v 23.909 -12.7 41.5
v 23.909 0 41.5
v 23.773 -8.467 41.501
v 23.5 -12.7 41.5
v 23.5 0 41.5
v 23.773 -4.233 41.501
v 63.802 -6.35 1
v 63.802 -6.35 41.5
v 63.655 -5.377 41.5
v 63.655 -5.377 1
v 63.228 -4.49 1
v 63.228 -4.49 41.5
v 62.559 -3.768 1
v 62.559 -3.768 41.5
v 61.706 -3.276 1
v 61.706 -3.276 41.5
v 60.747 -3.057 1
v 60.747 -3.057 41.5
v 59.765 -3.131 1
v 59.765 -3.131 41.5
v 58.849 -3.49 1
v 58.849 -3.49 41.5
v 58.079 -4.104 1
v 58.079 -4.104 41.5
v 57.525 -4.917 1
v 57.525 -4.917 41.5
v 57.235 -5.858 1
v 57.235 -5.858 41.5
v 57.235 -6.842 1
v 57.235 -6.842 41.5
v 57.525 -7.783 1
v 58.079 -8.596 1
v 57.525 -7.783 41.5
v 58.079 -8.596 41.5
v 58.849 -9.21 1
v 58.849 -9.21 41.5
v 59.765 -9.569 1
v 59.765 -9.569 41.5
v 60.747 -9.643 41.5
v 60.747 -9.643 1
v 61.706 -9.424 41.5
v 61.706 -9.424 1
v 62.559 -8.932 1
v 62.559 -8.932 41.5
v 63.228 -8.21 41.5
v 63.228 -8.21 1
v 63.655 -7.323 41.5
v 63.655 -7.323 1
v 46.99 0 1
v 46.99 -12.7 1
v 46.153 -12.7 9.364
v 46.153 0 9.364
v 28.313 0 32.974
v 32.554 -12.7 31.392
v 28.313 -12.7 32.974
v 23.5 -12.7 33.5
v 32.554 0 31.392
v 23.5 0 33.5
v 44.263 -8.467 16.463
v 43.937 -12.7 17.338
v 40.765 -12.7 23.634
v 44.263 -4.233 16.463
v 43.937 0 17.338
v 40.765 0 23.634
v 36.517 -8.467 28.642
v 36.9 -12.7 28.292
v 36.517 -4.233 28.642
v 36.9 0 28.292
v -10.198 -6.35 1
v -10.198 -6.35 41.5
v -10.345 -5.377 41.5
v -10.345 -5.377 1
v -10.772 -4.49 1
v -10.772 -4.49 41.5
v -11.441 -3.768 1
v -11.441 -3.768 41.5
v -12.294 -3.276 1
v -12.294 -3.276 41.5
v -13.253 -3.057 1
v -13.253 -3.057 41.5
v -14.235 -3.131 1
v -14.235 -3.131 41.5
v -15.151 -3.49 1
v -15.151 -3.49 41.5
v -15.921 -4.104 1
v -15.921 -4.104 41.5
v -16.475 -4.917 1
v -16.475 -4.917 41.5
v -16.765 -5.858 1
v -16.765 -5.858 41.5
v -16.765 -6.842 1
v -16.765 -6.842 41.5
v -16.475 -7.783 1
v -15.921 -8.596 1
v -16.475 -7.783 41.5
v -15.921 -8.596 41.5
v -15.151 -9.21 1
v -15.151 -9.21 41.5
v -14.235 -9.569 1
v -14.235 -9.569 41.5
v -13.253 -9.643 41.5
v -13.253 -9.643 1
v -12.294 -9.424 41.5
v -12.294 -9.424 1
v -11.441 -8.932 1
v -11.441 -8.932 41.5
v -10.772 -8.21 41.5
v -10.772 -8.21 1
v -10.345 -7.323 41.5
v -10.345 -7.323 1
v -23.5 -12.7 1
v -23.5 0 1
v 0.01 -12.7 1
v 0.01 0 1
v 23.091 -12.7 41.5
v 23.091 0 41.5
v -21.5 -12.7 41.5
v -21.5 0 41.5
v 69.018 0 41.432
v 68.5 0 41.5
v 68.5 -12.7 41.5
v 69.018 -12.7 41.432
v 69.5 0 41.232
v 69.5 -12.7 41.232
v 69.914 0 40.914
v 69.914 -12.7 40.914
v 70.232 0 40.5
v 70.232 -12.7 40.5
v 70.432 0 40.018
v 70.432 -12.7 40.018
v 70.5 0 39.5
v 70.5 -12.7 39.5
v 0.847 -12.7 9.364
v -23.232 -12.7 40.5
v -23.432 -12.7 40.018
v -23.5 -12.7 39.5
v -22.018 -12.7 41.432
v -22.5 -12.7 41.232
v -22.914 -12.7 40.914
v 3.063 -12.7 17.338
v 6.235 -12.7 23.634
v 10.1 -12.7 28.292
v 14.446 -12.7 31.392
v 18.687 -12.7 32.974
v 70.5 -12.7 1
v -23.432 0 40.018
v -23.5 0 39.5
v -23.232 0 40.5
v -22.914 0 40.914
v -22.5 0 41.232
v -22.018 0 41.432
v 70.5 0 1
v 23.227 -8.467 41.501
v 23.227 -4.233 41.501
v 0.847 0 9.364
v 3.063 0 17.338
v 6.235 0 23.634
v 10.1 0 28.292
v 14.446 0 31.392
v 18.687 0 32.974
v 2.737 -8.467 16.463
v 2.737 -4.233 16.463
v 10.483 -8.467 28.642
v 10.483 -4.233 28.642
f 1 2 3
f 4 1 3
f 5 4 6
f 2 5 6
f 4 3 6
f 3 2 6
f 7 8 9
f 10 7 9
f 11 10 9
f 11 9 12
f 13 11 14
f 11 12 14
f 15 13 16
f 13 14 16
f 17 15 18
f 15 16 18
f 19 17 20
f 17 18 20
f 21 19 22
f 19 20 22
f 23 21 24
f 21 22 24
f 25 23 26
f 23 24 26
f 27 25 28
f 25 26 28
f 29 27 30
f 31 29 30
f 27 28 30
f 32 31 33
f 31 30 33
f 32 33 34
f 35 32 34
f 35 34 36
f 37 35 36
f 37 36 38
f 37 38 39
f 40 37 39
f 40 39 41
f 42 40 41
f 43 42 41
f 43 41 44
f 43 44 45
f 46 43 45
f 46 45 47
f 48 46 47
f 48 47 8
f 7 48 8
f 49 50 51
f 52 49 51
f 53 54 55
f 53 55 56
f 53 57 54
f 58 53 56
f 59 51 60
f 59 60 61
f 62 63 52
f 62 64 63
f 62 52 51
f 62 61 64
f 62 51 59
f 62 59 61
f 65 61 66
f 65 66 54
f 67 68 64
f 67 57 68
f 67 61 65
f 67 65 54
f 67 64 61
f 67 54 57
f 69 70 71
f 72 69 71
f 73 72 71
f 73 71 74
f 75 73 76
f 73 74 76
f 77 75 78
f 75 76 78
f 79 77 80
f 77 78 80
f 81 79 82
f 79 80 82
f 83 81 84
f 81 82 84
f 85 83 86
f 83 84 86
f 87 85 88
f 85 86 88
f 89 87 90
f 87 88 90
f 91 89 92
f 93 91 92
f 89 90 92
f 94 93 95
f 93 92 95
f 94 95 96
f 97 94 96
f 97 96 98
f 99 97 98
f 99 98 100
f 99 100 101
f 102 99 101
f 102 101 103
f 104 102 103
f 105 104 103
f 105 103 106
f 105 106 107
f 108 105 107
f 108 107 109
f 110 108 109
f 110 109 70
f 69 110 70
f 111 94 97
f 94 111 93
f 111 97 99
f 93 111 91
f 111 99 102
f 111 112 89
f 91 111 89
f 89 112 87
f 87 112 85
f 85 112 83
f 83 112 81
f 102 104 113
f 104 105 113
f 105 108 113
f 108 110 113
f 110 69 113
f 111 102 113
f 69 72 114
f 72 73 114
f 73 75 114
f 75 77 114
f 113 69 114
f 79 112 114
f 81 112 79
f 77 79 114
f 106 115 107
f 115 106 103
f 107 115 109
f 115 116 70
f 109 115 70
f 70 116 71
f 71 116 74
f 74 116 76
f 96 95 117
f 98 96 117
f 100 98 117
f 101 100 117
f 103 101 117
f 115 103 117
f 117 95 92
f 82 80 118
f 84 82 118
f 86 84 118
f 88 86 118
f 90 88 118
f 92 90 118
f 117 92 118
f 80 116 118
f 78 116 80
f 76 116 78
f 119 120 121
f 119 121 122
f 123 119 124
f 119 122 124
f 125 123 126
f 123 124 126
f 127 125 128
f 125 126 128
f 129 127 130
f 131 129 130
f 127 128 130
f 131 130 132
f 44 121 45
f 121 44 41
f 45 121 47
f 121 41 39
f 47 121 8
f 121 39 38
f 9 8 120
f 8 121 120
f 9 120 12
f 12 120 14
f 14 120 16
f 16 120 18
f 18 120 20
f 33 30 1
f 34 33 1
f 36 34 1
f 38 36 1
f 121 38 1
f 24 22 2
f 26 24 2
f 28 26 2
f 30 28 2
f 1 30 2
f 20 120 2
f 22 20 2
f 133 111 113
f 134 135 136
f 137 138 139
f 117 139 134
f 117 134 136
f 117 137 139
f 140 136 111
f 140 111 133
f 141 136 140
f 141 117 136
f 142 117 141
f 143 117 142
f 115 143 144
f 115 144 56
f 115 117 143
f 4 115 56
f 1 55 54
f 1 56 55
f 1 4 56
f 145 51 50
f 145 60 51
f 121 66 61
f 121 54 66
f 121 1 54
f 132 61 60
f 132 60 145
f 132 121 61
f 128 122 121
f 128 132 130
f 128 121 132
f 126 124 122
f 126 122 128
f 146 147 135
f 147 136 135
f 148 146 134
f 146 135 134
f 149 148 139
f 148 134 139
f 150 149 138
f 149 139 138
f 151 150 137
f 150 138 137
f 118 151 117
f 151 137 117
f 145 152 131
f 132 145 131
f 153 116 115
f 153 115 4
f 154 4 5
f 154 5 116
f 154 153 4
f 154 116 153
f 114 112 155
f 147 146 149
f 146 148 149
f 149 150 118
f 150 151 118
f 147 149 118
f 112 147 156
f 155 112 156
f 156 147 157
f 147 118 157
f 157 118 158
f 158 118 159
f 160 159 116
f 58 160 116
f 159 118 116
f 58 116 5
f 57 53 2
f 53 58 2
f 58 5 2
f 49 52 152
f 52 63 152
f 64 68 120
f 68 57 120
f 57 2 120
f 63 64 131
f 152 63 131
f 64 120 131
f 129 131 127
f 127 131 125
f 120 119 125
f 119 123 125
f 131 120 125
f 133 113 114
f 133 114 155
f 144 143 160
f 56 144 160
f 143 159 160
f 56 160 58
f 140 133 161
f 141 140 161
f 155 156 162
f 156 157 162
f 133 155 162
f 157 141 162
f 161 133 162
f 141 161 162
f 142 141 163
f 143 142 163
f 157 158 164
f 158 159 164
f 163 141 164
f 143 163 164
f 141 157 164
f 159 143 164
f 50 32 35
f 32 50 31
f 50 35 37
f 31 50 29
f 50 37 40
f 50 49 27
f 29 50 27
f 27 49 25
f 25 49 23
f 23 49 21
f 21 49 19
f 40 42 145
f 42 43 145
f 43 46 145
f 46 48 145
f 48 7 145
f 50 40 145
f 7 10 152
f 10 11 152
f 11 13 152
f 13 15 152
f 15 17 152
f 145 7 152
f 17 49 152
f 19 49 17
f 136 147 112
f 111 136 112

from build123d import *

# Parameters (mm, degrees)
F1_DEPTH = 12.7
F2_R     = 3.302
F3_DEPTH = 41.5002601562
F4_W     = 102.0685225816
F4_H     = 3.4845213629
F5_DEPTH = 25
F6_R     = 2


# Not quite as in the source:
# - ends of sketch curves that miss each other by under 0.0002 mm in the source are joined
# - the dataset's text gives a spline's control points without its knots; the knots are read off the source's solid


with BuildPart() as f1:
    # F0 (on Front) → F1 (new body)
    with BuildSketch(Plane.XZ):
        with BuildLine():
            Line((-8, 0), (0, 0))
            add(Edge.make_bspline(
                [(0, 0), (0, 16.0348825157), (7.430841215, 33.6514413357), (23.5, 33.5)],
                knots=[0, 0, 0, 0, 40.9206549312, 40.9206549312, 40.9206549312, 40.9206549312], degree=3))
            add(Edge.make_bspline(
                [(47, 0), (47, 16.0348825157), (39.569158785, 33.6514413357), (23.5, 33.5)],
                knots=[0, 0, 0, 0, 40.9206549312, 40.9206549312, 40.9206549312, 40.9206549312], degree=3))
            Line((47, 0), (55, 0))
            add(Edge.make_bspline(
                [(55, 0), (55, 2.3133051501), (54.8084752548, 5.6604865088), (54.3346414744, 8.9941225704), (54.1644875118, 10.0000161913)],
                knots=[0, 0, 0, 0, 0.125, 0.1792883855, 0.1792883855, 0.1792883855, 0.1792883855], degree=3))
            add(Edge.make_bspline(
                [(54.1644875118, 10.0000161913), (53.9428588652, 11.3102110198), (53.2041802455, 14.9199242801), (51.403557473, 20.6965522199), (48.312647429, 27.0635606249), (44.7757382973, 31.8590791464), (41.27501086, 35.2044913237), (38.3020149436, 37.39930019), (34.9881581098, 39.2038242784), (31.3670929719, 40.5407901401), (27.6491274865, 41.3170292606), (25.11417344, 41.4919330376), (23.9092731988, 41.5002601562)],
                knots=[0.1792883855, 0.1792883855, 0.1792883855, 0.1792883855, 0.25, 0.375, 0.5, 0.625, 0.6875, 0.75, 0.8125, 0.875, 0.9375, 0.9926226885, 0.9926226885, 0.9926226885, 0.9926226885], degree=3))
            Line((23.9092731988, 41.5002601562), (23.5, 41.5002601562))
            Line((23.5, 41.5002601562), (23.0907268012, 41.5002601562))
            add(Edge.make_bspline(
                [(-7.1644875118, 10.0000161913), (-6.9428588652, 11.3102110198), (-6.2041802455, 14.9199242801), (-4.403557473, 20.6965522199), (-1.312647429, 27.0635606249), (2.2242617027, 31.8590791464), (5.72498914, 35.2044913237), (8.6979850564, 37.39930019), (12.0118418902, 39.2038242784), (15.6329070281, 40.5407901401), (19.3508725135, 41.3170292606), (21.88582656, 41.4919330376), (23.0907268012, 41.5002601562)],
                knots=[0.1792883855, 0.1792883855, 0.1792883855, 0.1792883855, 0.25, 0.375, 0.5, 0.625, 0.6875, 0.75, 0.8125, 0.875, 0.9375, 0.9926226885, 0.9926226885, 0.9926226885, 0.9926226885], degree=3))
            add(Edge.make_bspline(
                [(-8, 0), (-8, 2.3133051501), (-7.8084752548, 5.6604865088), (-7.3346414744, 8.9941225704), (-7.1644875118, 10.0000161913)],
                knots=[0, 0, 0, 0, 0.125, 0.1792883855, 0.1792883855, 0.1792883855, 0.1792883855], degree=3))
        make_face()
        with BuildLine():
            Line((-23.5, 0), (-8, 0))
            add(Edge.make_bspline(
                [(-8, 0), (-8, 2.3133051501), (-7.8084752548, 5.6604865088), (-7.3346414744, 8.9941225704), (-7.1644875118, 10.0000161913)],
                knots=[0, 0, 0, 0, 0.125, 0.1792883855, 0.1792883855, 0.1792883855, 0.1792883855], degree=3))
            Line((-7.1644875118, 10.0000161913), (-23.5, 10))
            Line((-23.5, 10), (-23.5, 0))
        make_face()
        with BuildLine():
            Line((-23.5, 10), (-7.1643917939, 10))
            add(Edge.make_bspline(
                [(-7.1643917939, 10), (-6.9428588652, 11.3102110198), (-6.2041802455, 14.9199242801), (-4.403557473, 20.6965522199), (-1.312647429, 27.0635606249), (2.2242617027, 31.8590791464), (5.72498914, 35.2044913237), (8.6979850564, 37.39930019), (12.0118418902, 39.2038242784), (15.6329070281, 40.5407901401), (19.3508725135, 41.3170292606), (21.88582656, 41.4919330376), (23.0907268012, 41.5002601562)],
                knots=[0.1792883855, 0.1792883855, 0.1792883855, 0.1792883855, 0.25, 0.375, 0.5, 0.625, 0.6875, 0.75, 0.8125, 0.875, 0.9375, 0.9926226885, 0.9926226885, 0.9926226885, 0.9926226885], degree=3))
            Line((23.0907268012, 41.5002601562), (-23.5, 41.5002601562))
            Line((-23.5, 41.5002601562), (-23.5, 10))
        make_face()
        with BuildLine():
            add(Edge.make_bspline(
                [(55, 0), (55, 2.3133051501), (54.8084752548, 5.6604865088), (54.3346414744, 8.9941225704), (54.1644875118, 10.0000161913)],
                knots=[0, 0, 0, 0, 0.125, 0.1792883855, 0.1792883855, 0.1792883855, 0.1792883855], degree=3))
            Line((55, 0), (70.5, 0))
            Line((70.5, 0), (70.5, 10))
            Line((70.5, 10), (54.1644875118, 10.0000161913))
        make_face()
        with BuildLine():
            add(Edge.make_bspline(
                [(23.0907268012, 41.5002601562), (23.2269381476, 41.5012015188), (23.3633657228, 41.5012017791), (23.499999998, 41.5002598872)],
                knots=[0.9926226885, 0.9926226885, 0.9926226885, 0.9926226885, 0.9988541884, 0.9988541884, 0.9988541884, 0.9988541884], degree=3))
            Line((23.0907268012, 41.5002601562), (23.499999998, 41.5002598872))
        make_face()
        with BuildLine():
            add(Edge.make_bspline(
                [(54.1644875118, 10.0000161913), (53.9428588652, 11.3102110198), (53.2041802455, 14.9199242801), (51.403557473, 20.6965522199), (48.312647429, 27.0635606249), (44.7757382973, 31.8590791464), (41.27501086, 35.2044913237), (38.3020149436, 37.39930019), (34.9881581098, 39.2038242784), (31.3670929719, 40.5407901401), (27.6491274865, 41.3170292606), (25.11417344, 41.4919330376), (23.9092731988, 41.5002601562)],
                knots=[0.1792883855, 0.1792883855, 0.1792883855, 0.1792883855, 0.25, 0.375, 0.5, 0.625, 0.6875, 0.75, 0.8125, 0.875, 0.9375, 0.9926226885, 0.9926226885, 0.9926226885, 0.9926226885], degree=3))
            Line((54.1644875118, 10.0000161913), (70.5, 10))
            Line((70.5, 10), (70.5, 41.5002601562))
            Line((70.5, 41.5002601562), (23.9092731988, 41.5002601562))
        make_face()
        with BuildLine():
            add(Edge.make_bspline(
                [(23.9092731988, 41.5002601562), (23.7730618524, 41.5012015188), (23.6366342772, 41.5012017791), (23.500000002, 41.5002598872)],
                knots=[0.9926226885, 0.9926226885, 0.9926226885, 0.9926226885, 0.9988541884, 0.9988541884, 0.9988541884, 0.9988541884], degree=3))
            Line((23.500000002, 41.5002598872), (23.9092731988, 41.5002601562))
        make_face()
    extrude(amount=F1_DEPTH)

    # F2 (on face) → F3 (cut, through all)
    with BuildSketch(Plane.XY.offset(41.5002601562)):
        with Locations((-13.5000000019, -6.35)):
            Circle(F2_R)
        with Locations((60.4999999981, -6.35)):
            Circle(F2_R)
    extrude(amount=-F3_DEPTH, mode=Mode.SUBTRACT)

    # F4 (on Front) → F5 (cut)
    with BuildSketch(Plane.XZ):
        with Locations((22.9078933551, -0.7422606815)):
            Rectangle(F4_W, F4_H)
    extrude(amount=F5_DEPTH, mode=Mode.SUBTRACT)

    # F6
    f6_edges = [f1.edges().sort_by_distance(p)[0] for p in [
        (70.5, -6.35, 41.50026),
        (-23.5, -6.35, 41.50026),
    ]]
    fillet(f6_edges, radius=F6_R)


solid = f1.part
